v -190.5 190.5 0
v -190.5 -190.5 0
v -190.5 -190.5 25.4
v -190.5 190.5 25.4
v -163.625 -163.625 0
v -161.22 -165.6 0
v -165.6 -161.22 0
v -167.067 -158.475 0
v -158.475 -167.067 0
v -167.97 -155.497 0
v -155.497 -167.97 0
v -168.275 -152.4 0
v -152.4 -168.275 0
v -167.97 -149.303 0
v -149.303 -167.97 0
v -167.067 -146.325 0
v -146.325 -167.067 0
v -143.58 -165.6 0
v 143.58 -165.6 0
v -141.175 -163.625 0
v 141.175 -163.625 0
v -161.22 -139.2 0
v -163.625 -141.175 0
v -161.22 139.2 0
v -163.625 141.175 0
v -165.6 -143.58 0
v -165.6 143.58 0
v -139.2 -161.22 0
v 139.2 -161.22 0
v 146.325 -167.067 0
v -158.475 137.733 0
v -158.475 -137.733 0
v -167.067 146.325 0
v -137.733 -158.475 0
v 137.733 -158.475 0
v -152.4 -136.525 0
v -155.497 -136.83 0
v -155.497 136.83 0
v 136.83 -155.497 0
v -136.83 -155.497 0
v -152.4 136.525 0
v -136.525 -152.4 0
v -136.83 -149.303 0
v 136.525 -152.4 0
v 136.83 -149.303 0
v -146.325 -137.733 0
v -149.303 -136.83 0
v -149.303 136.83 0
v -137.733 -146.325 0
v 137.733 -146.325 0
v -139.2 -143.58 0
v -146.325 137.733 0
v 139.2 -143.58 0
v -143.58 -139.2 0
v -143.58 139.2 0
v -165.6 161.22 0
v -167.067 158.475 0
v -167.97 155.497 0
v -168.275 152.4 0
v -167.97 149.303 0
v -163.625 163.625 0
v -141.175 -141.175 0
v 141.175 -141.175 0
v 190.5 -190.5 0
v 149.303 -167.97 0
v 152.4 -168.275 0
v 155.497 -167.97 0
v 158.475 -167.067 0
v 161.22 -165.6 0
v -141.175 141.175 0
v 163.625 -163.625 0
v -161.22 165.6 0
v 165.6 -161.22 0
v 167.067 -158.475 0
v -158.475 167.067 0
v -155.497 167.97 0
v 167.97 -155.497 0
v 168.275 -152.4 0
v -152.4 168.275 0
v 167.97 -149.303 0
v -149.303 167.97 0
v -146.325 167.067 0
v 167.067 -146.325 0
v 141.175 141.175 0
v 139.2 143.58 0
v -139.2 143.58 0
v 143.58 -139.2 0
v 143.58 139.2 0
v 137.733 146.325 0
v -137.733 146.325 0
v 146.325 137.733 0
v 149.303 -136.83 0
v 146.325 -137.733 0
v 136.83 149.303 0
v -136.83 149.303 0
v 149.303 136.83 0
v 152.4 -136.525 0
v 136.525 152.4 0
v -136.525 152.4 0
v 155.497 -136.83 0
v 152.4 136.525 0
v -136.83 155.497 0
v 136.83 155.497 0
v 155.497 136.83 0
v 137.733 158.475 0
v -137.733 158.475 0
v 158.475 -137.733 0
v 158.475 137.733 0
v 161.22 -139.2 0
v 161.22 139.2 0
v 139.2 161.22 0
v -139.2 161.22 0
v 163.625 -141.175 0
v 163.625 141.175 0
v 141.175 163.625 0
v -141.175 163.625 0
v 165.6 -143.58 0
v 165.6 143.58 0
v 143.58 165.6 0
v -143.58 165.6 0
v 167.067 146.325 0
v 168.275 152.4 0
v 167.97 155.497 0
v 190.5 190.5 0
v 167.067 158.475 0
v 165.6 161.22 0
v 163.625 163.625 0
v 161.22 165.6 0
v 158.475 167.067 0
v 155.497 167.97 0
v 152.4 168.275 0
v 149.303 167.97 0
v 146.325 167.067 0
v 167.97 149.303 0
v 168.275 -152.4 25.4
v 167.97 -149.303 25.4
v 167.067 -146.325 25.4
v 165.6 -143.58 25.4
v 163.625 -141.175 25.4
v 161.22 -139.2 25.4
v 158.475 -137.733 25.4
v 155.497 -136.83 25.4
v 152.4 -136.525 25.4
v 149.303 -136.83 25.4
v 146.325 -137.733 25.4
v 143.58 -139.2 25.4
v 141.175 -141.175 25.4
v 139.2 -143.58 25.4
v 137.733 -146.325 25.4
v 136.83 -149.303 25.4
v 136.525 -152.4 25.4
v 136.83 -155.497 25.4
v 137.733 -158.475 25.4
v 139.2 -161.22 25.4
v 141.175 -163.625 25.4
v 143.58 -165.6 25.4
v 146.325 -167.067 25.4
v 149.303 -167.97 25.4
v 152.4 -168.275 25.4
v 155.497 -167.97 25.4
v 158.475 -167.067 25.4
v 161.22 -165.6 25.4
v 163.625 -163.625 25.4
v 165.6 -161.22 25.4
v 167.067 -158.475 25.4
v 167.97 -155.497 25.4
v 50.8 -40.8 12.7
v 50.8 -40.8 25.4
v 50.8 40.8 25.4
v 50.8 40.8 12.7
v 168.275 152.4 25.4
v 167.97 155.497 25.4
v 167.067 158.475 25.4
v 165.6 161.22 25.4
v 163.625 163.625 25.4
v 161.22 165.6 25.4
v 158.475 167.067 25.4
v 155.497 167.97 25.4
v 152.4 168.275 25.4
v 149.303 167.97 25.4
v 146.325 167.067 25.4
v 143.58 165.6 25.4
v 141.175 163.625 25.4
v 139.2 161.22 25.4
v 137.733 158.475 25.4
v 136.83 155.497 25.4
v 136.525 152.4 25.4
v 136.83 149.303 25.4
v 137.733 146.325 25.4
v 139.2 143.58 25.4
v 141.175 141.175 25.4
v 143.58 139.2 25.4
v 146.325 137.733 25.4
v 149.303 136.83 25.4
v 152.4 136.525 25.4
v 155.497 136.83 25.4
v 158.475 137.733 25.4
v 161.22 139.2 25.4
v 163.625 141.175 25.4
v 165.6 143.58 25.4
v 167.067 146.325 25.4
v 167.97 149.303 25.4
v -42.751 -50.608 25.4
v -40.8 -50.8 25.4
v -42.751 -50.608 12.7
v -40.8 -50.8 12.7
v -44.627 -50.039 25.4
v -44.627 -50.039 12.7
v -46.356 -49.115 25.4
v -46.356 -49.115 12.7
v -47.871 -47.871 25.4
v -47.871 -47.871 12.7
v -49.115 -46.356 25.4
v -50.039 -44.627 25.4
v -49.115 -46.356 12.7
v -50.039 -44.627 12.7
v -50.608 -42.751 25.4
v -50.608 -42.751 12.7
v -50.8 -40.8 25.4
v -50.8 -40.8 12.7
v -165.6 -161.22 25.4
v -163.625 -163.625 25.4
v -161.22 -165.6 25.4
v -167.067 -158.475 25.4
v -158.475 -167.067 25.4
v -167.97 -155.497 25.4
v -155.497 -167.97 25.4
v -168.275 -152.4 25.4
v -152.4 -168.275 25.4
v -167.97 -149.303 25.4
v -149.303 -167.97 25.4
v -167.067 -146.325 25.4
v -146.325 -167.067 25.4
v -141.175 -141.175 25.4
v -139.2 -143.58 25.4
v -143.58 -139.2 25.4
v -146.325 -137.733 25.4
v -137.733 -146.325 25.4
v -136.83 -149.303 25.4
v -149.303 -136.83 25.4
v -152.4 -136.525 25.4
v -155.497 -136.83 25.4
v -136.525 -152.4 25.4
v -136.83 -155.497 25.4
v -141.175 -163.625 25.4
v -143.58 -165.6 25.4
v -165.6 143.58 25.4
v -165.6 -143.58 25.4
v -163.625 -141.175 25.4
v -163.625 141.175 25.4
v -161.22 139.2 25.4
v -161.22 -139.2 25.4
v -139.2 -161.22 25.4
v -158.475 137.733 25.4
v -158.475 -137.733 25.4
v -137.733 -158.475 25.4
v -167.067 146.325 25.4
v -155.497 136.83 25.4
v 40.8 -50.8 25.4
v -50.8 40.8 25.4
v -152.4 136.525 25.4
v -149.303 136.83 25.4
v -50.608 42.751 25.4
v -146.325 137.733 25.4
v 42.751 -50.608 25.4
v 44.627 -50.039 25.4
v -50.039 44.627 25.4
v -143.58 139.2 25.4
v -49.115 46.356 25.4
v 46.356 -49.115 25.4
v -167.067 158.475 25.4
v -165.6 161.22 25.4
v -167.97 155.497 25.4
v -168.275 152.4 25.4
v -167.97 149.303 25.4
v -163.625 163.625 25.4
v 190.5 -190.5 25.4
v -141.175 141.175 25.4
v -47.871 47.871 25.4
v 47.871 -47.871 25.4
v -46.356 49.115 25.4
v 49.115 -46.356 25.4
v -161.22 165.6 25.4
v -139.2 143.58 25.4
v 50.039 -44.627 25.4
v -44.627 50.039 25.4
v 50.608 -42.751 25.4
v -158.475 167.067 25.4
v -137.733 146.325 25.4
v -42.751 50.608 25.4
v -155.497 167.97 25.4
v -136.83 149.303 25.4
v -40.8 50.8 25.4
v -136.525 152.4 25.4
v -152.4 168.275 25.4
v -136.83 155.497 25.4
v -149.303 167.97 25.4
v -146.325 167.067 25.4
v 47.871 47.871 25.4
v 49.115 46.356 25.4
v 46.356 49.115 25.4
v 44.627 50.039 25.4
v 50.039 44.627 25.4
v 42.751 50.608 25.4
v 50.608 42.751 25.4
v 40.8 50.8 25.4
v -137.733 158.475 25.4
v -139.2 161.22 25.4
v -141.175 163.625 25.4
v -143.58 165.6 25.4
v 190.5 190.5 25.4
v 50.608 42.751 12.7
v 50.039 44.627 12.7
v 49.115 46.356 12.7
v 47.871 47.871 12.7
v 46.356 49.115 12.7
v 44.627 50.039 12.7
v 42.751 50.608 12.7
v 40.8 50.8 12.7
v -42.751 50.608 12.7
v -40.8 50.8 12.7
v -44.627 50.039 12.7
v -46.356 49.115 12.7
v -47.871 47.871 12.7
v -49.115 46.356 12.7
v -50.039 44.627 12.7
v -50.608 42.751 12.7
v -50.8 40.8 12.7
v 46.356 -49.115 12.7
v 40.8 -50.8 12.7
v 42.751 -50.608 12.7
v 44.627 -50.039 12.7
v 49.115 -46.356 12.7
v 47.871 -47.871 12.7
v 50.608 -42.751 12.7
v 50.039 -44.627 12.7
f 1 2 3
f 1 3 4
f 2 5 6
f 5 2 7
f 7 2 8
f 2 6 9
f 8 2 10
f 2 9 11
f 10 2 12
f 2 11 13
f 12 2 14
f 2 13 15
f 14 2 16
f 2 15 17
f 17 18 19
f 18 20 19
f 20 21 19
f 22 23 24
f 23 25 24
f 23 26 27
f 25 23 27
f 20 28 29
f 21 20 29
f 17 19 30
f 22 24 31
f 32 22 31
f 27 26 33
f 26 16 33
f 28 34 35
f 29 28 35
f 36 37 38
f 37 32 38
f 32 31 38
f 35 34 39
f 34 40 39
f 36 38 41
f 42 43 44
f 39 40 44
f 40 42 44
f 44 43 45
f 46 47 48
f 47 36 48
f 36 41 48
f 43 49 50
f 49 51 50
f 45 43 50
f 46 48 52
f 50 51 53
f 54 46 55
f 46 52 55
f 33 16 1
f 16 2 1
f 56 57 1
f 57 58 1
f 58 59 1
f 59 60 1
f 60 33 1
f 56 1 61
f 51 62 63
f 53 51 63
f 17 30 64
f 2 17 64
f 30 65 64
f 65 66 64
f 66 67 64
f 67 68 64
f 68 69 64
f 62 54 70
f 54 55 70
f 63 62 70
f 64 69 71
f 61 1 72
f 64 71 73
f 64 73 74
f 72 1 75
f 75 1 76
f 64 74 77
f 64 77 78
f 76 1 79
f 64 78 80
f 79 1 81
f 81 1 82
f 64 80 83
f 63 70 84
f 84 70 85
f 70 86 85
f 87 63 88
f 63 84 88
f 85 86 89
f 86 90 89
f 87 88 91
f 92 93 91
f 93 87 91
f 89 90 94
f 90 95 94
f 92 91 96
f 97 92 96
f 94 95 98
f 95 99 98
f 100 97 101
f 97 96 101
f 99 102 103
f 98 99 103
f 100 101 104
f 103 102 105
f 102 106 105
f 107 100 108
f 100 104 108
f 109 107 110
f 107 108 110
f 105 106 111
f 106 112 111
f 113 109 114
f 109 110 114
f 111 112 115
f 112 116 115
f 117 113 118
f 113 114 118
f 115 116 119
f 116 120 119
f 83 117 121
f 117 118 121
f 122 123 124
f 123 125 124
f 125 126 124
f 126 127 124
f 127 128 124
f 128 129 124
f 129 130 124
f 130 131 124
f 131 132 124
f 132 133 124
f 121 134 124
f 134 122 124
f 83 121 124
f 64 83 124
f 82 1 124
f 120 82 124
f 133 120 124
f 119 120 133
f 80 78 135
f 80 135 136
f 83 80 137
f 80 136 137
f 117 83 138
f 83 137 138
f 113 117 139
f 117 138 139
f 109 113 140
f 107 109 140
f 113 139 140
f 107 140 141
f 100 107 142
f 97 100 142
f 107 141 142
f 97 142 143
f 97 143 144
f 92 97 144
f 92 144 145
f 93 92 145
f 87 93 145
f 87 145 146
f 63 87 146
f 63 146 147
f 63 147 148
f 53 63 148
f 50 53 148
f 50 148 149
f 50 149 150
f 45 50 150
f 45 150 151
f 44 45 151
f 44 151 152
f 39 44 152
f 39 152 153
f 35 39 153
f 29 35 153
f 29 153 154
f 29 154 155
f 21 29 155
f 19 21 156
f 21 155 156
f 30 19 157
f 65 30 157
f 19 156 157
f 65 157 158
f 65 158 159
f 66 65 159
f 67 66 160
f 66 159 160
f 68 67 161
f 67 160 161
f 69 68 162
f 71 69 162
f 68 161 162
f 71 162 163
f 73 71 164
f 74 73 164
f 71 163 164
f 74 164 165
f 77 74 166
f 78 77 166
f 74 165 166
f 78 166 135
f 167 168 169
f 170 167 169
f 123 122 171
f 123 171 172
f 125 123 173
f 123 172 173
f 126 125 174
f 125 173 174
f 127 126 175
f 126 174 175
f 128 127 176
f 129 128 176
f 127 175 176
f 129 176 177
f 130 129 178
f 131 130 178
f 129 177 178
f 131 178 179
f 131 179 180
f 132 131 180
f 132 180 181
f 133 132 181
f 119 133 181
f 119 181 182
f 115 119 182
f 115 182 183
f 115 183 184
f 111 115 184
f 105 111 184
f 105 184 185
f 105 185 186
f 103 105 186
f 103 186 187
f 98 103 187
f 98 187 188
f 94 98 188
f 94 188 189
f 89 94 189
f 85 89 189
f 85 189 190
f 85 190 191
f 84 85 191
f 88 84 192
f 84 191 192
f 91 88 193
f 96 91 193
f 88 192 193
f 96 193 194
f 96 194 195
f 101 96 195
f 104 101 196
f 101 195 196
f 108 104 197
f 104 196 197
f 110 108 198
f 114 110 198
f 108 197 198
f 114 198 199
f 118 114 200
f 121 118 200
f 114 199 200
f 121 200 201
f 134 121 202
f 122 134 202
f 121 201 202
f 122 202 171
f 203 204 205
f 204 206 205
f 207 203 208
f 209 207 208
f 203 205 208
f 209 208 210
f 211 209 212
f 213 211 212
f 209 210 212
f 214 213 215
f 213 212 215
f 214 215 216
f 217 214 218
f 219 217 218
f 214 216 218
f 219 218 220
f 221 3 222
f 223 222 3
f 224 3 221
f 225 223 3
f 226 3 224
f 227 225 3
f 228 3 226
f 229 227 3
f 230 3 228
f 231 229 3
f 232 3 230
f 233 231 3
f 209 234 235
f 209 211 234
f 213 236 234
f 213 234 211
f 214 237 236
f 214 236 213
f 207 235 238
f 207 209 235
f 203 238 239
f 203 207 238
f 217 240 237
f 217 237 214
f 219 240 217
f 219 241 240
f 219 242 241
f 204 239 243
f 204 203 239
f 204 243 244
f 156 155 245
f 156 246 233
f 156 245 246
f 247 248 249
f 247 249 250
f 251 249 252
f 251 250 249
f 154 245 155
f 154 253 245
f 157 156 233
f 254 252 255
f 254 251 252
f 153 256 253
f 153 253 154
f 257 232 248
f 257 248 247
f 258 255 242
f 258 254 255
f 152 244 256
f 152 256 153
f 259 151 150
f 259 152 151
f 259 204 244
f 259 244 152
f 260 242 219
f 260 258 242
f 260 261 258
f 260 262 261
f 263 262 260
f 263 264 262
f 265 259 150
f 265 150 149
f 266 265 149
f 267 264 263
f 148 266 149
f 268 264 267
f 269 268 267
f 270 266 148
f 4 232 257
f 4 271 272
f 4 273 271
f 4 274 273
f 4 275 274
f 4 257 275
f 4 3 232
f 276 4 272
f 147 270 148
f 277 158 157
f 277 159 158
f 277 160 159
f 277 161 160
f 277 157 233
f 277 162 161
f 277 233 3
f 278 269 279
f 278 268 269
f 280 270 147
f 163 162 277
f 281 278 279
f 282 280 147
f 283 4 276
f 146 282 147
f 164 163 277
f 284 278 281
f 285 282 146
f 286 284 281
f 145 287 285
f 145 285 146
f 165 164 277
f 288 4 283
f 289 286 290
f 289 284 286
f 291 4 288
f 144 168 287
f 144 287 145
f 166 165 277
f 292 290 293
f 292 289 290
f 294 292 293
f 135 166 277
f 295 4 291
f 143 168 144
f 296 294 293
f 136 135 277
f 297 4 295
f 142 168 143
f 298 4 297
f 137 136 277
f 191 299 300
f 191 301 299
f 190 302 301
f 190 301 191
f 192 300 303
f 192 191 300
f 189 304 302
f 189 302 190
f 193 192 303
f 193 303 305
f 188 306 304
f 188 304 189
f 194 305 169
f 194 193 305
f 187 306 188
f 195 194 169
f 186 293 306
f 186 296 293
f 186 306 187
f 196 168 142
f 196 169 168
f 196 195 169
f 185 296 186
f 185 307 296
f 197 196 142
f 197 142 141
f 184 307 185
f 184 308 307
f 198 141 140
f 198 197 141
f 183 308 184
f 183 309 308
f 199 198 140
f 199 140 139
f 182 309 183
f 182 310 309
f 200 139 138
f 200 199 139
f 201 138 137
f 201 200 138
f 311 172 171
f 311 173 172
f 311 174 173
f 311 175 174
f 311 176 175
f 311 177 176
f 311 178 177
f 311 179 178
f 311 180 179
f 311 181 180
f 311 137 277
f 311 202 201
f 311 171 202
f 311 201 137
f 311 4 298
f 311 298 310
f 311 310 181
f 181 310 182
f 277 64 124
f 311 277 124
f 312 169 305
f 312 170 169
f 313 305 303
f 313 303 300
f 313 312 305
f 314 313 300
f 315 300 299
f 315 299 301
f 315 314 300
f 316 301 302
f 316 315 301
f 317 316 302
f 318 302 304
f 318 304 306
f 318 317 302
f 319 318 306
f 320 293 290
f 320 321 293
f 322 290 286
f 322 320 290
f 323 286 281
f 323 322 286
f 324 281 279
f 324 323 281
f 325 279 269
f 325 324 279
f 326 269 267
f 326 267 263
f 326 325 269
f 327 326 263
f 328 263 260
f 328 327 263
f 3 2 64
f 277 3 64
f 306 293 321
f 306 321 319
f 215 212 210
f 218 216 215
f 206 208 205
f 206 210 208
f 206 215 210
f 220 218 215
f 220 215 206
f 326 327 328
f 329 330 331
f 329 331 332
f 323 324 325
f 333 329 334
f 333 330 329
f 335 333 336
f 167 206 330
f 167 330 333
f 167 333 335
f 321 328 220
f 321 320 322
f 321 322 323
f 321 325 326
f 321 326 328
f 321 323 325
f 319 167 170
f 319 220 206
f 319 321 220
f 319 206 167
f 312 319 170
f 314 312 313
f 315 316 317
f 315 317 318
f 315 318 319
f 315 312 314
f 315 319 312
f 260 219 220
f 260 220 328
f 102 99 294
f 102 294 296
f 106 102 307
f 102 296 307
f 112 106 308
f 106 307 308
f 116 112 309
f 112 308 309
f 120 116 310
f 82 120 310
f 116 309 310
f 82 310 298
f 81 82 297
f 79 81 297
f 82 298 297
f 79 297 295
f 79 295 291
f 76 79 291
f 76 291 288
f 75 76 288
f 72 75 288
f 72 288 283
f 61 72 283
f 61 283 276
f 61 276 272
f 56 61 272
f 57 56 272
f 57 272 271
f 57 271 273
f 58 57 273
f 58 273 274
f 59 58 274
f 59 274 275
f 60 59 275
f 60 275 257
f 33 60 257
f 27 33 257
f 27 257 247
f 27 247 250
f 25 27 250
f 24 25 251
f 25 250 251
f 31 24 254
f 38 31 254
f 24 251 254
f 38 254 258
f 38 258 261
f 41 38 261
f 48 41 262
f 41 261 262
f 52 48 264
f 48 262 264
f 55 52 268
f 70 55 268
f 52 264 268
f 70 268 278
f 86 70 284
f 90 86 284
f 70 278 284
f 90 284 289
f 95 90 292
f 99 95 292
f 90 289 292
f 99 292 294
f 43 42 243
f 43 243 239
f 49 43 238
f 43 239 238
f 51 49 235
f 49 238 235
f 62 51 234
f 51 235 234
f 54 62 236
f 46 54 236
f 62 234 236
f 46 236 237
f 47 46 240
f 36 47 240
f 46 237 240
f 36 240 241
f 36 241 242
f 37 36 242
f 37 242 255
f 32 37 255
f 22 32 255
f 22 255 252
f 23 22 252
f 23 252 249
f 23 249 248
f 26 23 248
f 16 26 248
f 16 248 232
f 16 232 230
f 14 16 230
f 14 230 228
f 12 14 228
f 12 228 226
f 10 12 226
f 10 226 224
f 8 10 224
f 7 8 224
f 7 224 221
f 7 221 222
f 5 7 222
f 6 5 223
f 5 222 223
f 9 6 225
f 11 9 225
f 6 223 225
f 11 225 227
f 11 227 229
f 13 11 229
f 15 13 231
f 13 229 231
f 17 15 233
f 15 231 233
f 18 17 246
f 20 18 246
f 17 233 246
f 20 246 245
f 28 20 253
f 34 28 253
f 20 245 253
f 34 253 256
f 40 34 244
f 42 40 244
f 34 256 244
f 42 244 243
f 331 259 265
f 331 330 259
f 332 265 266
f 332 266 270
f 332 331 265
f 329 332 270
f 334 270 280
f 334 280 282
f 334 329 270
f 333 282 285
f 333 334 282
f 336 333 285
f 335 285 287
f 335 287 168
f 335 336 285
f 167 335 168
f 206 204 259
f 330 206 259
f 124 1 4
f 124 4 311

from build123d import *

# Parameters (mm, degrees)
F0_W     = 381
F0_H     = 381
F1_DEPTH = 25.4
F2_W     = 101.6
F2_H     = 101.6
F3_DEPTH = 12.7
F4_R     = 10
F5_R     = 15.875
F6_DEPTH = 50


with BuildPart() as f1:
    # F0 (on Top) → F1 (new body)
    with BuildSketch(Plane.XY):
        Rectangle(F0_W, F0_H)
    extrude(amount=F1_DEPTH)

    # F2 (on face) → F3 (cut)
    with BuildSketch(Plane.XY.offset(25.4)):
        Rectangle(F2_W, F2_H)
    extrude(amount=-F3_DEPTH, mode=Mode.SUBTRACT)

    # F4
    f4_edges = [f1.edges().sort_by_distance(p)[0] for p in [
        (50.8, 50.8, 19.05),
        (-50.8, 50.8, 19.05),
        (-50.8, -50.8, 19.05),
        (50.8, -50.8, 19.05),
    ]]
    fillet(f4_edges, radius=F4_R)

    # F5 (on face) → F6 (cut)
    with BuildSketch(Plane.XY.offset(25.4)):
        with Locations((-152.4, -152.4)):
            Circle(F5_R)
        with Locations((-152.4, 152.4)):
            Circle(F5_R)
        with Locations((152.4, -152.4)):
            Circle(F5_R)
        with Locations((152.4, 152.4)):
            Circle(F5_R)
    extrude(amount=-F6_DEPTH, mode=Mode.SUBTRACT)


solid = f1.part
